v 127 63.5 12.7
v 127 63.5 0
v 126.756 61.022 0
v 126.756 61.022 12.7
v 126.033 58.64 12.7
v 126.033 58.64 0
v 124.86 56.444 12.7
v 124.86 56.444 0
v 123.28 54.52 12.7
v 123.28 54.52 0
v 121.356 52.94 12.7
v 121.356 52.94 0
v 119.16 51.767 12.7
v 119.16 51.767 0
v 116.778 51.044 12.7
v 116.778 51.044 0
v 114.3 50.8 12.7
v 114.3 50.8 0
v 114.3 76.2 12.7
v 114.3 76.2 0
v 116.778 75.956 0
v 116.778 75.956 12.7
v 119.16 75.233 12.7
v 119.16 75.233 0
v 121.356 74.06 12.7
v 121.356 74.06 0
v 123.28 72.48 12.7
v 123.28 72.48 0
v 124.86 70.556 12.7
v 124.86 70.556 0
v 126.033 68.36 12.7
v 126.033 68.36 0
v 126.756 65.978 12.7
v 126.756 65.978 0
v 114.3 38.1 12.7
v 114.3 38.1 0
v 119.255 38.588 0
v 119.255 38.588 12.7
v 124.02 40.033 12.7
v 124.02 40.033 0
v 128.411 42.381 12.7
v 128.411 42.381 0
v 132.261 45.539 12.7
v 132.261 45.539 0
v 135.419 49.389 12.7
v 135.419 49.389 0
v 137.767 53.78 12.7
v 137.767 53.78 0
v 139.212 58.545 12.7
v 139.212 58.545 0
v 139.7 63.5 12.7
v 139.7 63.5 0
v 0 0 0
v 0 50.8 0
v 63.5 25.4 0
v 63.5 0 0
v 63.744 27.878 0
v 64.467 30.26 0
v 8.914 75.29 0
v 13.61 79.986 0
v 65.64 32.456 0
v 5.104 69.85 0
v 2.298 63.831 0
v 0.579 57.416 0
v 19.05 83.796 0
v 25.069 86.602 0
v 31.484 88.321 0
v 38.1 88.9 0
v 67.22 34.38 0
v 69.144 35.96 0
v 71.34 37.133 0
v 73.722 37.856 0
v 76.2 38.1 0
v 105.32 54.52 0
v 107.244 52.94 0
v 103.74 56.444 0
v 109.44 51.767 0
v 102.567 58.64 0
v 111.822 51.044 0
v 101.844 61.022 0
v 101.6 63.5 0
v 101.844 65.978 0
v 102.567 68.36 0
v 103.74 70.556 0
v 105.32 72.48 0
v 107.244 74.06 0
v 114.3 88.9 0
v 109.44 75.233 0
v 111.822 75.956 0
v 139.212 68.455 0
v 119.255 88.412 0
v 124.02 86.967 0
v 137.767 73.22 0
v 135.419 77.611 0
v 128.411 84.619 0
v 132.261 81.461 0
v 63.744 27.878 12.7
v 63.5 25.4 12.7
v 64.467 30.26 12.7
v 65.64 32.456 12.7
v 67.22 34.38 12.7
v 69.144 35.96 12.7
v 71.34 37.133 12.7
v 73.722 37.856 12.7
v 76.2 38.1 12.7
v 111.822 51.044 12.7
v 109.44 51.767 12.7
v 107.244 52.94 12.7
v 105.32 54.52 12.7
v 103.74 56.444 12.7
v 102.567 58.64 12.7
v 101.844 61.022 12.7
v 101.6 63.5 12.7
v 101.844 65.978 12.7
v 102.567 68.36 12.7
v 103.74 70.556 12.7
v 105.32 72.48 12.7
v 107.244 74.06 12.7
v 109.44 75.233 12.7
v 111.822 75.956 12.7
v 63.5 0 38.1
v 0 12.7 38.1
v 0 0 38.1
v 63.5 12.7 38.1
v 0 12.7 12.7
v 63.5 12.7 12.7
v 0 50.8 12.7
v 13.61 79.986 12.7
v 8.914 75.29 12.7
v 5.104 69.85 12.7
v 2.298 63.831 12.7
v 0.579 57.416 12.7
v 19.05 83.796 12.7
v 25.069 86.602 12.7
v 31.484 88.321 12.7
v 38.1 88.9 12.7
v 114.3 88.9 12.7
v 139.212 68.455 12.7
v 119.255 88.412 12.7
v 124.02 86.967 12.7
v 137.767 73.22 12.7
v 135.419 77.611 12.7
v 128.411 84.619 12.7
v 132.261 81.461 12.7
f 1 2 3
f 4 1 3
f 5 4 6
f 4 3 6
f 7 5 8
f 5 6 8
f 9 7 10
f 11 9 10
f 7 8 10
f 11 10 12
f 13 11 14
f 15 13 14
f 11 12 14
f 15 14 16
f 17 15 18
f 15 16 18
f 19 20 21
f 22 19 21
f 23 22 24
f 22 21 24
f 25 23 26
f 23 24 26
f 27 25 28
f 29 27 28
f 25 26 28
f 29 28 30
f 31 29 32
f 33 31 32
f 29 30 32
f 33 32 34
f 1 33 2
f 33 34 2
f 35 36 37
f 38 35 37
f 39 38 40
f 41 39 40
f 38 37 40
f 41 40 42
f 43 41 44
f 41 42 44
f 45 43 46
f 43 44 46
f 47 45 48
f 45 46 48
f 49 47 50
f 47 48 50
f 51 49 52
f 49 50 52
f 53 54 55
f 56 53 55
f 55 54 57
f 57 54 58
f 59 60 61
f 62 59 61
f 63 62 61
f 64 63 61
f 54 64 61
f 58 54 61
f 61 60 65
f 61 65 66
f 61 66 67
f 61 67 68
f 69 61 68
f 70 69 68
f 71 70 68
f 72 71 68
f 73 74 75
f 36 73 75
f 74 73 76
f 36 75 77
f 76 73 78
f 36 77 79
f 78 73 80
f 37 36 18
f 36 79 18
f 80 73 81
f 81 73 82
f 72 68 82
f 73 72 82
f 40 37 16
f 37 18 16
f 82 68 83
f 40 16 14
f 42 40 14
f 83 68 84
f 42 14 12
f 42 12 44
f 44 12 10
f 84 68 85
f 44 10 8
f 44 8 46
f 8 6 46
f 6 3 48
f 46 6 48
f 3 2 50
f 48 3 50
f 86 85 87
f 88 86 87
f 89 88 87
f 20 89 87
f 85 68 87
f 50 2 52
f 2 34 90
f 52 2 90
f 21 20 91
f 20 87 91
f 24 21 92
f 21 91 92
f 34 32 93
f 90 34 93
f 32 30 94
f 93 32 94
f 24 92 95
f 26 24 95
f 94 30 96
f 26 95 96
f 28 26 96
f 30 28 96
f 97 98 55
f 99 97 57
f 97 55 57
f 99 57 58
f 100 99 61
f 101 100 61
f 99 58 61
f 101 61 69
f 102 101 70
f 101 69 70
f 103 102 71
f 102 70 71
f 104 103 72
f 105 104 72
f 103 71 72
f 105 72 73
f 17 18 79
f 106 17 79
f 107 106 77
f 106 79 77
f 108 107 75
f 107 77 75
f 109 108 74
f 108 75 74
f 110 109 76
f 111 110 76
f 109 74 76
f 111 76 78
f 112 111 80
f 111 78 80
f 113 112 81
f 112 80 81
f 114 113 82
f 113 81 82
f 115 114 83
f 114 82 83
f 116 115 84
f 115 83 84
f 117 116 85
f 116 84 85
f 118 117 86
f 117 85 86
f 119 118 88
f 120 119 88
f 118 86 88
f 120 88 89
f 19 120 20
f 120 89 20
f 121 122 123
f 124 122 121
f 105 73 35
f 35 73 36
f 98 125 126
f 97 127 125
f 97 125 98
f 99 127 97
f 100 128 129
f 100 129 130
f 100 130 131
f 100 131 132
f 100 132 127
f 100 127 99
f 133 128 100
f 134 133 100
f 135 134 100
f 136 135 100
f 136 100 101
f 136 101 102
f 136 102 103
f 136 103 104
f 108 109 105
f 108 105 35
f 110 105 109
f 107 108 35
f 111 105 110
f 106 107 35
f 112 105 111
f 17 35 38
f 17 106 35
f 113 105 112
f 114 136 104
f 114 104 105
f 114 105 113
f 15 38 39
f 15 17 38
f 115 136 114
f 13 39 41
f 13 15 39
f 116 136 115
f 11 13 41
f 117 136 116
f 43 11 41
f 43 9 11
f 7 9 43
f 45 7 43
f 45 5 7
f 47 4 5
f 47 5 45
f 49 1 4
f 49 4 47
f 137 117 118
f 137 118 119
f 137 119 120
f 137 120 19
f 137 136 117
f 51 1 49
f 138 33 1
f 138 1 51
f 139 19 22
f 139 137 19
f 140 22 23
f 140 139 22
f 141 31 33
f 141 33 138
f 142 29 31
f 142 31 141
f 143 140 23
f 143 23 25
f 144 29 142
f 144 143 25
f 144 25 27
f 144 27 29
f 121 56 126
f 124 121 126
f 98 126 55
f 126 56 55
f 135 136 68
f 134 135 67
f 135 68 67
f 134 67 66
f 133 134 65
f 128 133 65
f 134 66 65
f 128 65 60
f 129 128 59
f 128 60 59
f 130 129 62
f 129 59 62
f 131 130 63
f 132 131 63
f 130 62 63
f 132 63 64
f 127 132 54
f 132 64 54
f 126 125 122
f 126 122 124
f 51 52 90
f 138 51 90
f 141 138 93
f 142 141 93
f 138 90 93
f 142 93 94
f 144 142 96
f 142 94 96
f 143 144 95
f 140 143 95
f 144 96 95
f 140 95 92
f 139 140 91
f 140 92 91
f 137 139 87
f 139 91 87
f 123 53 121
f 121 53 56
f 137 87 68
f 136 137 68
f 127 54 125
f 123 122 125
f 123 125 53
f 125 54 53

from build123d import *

# Parameters (mm, degrees)
SKETCH1_W           = 63.5
SKETCH1_H           = 12.7
BOSS_EXTRUDE1_DEPTH = 38.1
SKETCH1_4_R         = 12.7
BOSS_EXTRUDE2_DEPTH = 12.7


with BuildPart() as part:
    # Sketch1 → Boss-Extrude1 (new body)
    with BuildSketch(Plane.XY):
        with Locations((31.75, 6.35)):
            Rectangle(SKETCH1_W, SKETCH1_H)
    extrude(amount=BOSS_EXTRUDE1_DEPTH)

    # Sketch1<4> → Boss-Extrude2 (add)
    with BuildSketch(Plane.XY):
        with BuildLine():
            Line((0, 50.8), (0, 12.7))
            Line((0, 12.7), (63.5, 12.7))
            Line((63.5, 12.7), (63.5, 25.4))
            ThreePointArc((63.5, 25.4), (67.219743879, 34.380256121), (76.2, 38.1))
            Line((76.2, 38.1), (114.3, 38.1))
            ThreePointArc((114.3, 38.1), (139.7, 63.5), (114.3, 88.9))
            Line((114.3, 88.9), (38.1, 88.9))
            ThreePointArc((38.1, 88.9), (11.159231637, 77.740768363), (0, 50.8))
        make_face()
        with Locations((114.3, 63.5)):
            Circle(SKETCH1_4_R, mode=Mode.SUBTRACT)
    extrude(amount=BOSS_EXTRUDE2_DEPTH)


solid = part.part
